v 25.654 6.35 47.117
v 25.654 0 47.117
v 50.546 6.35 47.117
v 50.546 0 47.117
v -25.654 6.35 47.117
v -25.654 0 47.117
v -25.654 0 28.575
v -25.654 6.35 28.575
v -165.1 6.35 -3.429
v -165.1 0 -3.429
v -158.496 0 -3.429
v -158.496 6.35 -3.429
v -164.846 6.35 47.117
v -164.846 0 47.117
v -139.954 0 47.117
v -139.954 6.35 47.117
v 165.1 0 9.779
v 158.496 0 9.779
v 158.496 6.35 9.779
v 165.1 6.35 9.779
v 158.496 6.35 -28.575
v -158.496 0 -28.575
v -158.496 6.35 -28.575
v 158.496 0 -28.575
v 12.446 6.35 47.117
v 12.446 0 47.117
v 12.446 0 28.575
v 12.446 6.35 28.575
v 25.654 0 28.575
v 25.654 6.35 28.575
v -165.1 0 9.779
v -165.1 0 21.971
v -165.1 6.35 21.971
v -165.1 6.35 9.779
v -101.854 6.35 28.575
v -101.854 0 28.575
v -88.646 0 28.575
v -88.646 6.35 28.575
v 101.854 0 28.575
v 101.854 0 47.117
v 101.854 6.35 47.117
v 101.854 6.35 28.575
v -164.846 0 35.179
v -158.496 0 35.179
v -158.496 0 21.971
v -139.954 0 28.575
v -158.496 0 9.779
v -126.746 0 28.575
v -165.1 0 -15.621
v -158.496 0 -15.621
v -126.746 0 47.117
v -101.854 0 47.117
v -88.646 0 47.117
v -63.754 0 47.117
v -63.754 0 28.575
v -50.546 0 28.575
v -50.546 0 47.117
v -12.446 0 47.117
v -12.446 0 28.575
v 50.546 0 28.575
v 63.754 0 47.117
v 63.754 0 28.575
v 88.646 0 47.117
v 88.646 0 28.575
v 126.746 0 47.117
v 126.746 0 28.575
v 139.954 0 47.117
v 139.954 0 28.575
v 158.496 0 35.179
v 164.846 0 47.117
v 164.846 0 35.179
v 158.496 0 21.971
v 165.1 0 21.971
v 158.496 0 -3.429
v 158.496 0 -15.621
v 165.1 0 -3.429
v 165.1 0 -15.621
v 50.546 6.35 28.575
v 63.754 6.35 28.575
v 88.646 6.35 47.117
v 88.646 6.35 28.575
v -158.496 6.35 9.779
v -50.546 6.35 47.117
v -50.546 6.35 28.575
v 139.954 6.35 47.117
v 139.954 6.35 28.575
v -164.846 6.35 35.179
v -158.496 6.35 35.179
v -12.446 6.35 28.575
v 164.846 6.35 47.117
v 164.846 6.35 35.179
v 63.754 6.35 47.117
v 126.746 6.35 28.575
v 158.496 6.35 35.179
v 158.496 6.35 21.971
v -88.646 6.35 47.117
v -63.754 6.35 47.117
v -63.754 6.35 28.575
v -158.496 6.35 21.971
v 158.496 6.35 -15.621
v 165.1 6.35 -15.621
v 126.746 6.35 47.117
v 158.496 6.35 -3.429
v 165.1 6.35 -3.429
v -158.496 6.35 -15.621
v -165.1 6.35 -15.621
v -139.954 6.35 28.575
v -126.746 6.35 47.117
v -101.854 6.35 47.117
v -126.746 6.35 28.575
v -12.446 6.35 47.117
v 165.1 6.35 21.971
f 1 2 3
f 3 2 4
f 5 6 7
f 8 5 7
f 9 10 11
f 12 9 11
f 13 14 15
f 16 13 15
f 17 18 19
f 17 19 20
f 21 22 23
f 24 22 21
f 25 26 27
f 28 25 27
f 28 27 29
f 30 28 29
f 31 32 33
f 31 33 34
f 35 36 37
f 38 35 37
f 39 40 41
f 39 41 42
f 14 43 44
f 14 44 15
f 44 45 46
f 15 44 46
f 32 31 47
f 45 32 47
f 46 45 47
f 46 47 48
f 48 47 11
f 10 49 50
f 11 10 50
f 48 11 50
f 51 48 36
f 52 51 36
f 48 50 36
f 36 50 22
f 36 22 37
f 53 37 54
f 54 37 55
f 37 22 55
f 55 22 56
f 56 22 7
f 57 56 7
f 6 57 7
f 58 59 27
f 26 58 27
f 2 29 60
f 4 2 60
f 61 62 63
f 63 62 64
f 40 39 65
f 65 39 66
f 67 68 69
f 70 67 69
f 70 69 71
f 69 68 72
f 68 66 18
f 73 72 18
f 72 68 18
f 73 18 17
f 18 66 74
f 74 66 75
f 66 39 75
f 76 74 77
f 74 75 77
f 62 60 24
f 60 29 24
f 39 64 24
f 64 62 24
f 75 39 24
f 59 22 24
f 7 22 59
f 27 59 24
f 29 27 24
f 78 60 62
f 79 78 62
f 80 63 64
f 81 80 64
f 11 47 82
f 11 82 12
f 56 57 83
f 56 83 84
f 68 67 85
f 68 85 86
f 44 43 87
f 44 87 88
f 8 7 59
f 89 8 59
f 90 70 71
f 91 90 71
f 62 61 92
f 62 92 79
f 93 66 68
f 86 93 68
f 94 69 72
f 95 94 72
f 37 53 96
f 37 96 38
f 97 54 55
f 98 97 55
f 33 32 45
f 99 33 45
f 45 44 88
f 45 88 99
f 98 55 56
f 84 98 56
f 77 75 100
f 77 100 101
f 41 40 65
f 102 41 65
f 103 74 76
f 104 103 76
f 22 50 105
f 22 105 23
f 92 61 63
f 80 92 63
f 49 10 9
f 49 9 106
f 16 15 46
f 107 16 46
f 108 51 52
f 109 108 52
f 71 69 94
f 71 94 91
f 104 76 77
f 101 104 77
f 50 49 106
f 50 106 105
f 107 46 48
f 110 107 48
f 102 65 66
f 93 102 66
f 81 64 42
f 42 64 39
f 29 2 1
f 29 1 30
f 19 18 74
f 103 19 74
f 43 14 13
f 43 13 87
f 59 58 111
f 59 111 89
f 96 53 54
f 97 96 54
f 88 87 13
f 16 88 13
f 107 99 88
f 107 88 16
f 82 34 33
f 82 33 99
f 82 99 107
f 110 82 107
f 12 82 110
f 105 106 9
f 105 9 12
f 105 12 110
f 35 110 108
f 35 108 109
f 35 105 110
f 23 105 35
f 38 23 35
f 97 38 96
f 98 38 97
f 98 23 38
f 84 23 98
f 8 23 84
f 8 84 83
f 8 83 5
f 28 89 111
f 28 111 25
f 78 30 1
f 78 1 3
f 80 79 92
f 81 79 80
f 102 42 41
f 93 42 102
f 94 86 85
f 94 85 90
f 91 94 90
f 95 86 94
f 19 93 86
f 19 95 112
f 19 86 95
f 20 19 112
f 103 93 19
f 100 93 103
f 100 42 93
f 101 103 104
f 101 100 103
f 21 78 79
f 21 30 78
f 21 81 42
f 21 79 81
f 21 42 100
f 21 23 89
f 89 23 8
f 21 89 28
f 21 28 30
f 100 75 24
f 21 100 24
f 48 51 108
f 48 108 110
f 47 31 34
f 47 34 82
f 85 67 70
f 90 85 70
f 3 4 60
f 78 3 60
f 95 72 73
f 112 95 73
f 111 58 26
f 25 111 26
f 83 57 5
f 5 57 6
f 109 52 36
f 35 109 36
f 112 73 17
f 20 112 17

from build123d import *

# Parameters (mm, degrees)
SKETCH1_W           = 330.2
SKETCH1_H           = 57.15
BOSS_EXTRUDE1_DEPTH = 6.35
SKETCH3_W           = 24.892
SKETCH3_H           = 18.542
BOSS_EXTRUDE2_DEPTH = 6.35
SKETCH4_W           = 13.208
SKETCH4_H           = 13.208
CUT_EXTRUDE2_DEPTH  = 172.809034073


with BuildPart() as part:
    # Sketch1 → Boss-Extrude1 (new body)
    with BuildSketch(Plane(origin=(0, 0, 0), x_dir=(1, 0, 0), z_dir=(0, 1, 0))):
        Rectangle(SKETCH1_W, SKETCH1_H)
    extrude(amount=BOSS_EXTRUDE1_DEPTH)

    # Sketch3 → Boss-Extrude2 (add)
    with BuildSketch(Plane(origin=(0, 0, 0), x_dir=(1, 0, 0), z_dir=(0, 1, 0))):
        with Locations((-114.3, -37.846)):
            Rectangle(SKETCH3_W, SKETCH3_H)
        with Locations((-76.2, -37.846)):
            Rectangle(SKETCH3_W, SKETCH3_H)
        with Locations((-38.1, -37.846)):
            Rectangle(SKETCH3_W, SKETCH3_H)
        with Locations((0, -37.846)):
            Rectangle(SKETCH3_W, SKETCH3_H)
        with Locations((38.1, -37.846)):
            Rectangle(SKETCH3_W, SKETCH3_H)
        with Locations((76.2, -37.846)):
            Rectangle(SKETCH3_W, SKETCH3_H)
        with Locations((114.3, -37.846)):
            Rectangle(SKETCH3_W, SKETCH3_H)
        with Locations((152.4, -37.846)):
            Rectangle(SKETCH3_W, SKETCH3_H)
        with Locations((-152.4, -37.846)):
            Rectangle(SKETCH3_W, SKETCH3_H)
    extrude(amount=BOSS_EXTRUDE2_DEPTH)

    # Sketch4 → Cut-Extrude2 (cut, through all)
    with BuildSketch(Plane(origin=(0, 0, 0), x_dir=(1, 0, 0), z_dir=(0, 1, 0))):
        with Locations((165.1, 22.225)):
            Rectangle(SKETCH4_W, SKETCH4_H)
        with Locations((-165.1, -28.575)):
            Rectangle(SKETCH4_W, SKETCH4_H)
        with Locations((165.1, -3.175)):
            Rectangle(SKETCH4_W, SKETCH4_H)
        with Locations((165.1, -28.575)):
            Rectangle(SKETCH4_W, SKETCH4_H)
        with Locations((-165.1, -3.175)):
            Rectangle(SKETCH4_W, SKETCH4_H)
        with Locations((-165.1, 22.225)):
            Rectangle(SKETCH4_W, SKETCH4_H)
    extrude(amount=CUT_EXTRUDE2_DEPTH, mode=Mode.SUBTRACT)


solid = part.part
